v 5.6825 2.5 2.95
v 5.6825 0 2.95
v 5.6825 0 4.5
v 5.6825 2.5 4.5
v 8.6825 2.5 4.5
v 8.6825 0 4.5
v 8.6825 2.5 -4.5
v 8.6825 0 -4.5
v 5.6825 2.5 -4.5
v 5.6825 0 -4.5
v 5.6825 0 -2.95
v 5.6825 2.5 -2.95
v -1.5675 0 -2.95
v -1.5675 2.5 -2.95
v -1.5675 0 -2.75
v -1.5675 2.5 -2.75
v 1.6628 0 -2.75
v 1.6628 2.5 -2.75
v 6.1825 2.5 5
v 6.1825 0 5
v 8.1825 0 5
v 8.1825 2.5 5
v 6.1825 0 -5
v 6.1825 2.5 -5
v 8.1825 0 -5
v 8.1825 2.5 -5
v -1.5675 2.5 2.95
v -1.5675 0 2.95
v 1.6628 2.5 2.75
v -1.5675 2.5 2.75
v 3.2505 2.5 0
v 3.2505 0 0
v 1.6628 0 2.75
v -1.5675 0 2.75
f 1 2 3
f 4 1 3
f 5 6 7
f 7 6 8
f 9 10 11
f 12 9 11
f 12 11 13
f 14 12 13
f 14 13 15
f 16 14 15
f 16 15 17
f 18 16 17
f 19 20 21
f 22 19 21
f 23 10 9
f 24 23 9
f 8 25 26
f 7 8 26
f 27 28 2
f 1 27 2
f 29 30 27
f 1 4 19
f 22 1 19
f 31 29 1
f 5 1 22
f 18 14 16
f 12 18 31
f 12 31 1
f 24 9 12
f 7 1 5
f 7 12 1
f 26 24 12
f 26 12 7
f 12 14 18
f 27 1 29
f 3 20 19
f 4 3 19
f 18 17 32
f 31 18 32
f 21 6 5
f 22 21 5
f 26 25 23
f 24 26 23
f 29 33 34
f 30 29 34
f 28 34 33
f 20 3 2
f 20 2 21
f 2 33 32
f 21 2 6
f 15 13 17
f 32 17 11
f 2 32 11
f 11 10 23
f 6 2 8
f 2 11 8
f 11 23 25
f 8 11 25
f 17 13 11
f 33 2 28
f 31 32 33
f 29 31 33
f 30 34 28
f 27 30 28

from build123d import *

# Parameters (mm, degrees)
BOSS_EXTRUDE1_DEPTH = 2.5
CHAMFER1_SIZE       = 0.5


with BuildPart() as part:
    # Sketch1 → Boss-Extrude1 (new body)
    with BuildSketch(Plane(origin=(0, 0, 0), x_dir=(1, 0, 0), z_dir=(0, 1, 0))):
        Polygon((1.662768775, 2.75), (3.250482016, 0), (1.662768775, -2.75), (-1.567505981, -2.75), (-1.567505981, -2.95), (5.682494019, -2.95), (5.682494019, 2.95), (-1.567505981, 2.95), (-1.567505981, 2.75), align=None)
        Polygon((5.682494019, 5), (5.682494019, 2.95), (5.682494019, -2.95), (5.682494019, -5), (8.682494019, -5), (8.682494019, 5), align=None)
    extrude(amount=BOSS_EXTRUDE1_DEPTH)

    # Chamfer1
    chamfer1_edges = [part.edges().sort_by_distance(p)[0] for p in [
        (5.682494019, 1.25, -5),
        (8.682494019, 1.25, -5),
        (8.682494019, 1.25, 5),
        (5.682494019, 1.25, 5),
    ]]
    chamfer(chamfer1_edges, length=CHAMFER1_SIZE)


solid = part.part
